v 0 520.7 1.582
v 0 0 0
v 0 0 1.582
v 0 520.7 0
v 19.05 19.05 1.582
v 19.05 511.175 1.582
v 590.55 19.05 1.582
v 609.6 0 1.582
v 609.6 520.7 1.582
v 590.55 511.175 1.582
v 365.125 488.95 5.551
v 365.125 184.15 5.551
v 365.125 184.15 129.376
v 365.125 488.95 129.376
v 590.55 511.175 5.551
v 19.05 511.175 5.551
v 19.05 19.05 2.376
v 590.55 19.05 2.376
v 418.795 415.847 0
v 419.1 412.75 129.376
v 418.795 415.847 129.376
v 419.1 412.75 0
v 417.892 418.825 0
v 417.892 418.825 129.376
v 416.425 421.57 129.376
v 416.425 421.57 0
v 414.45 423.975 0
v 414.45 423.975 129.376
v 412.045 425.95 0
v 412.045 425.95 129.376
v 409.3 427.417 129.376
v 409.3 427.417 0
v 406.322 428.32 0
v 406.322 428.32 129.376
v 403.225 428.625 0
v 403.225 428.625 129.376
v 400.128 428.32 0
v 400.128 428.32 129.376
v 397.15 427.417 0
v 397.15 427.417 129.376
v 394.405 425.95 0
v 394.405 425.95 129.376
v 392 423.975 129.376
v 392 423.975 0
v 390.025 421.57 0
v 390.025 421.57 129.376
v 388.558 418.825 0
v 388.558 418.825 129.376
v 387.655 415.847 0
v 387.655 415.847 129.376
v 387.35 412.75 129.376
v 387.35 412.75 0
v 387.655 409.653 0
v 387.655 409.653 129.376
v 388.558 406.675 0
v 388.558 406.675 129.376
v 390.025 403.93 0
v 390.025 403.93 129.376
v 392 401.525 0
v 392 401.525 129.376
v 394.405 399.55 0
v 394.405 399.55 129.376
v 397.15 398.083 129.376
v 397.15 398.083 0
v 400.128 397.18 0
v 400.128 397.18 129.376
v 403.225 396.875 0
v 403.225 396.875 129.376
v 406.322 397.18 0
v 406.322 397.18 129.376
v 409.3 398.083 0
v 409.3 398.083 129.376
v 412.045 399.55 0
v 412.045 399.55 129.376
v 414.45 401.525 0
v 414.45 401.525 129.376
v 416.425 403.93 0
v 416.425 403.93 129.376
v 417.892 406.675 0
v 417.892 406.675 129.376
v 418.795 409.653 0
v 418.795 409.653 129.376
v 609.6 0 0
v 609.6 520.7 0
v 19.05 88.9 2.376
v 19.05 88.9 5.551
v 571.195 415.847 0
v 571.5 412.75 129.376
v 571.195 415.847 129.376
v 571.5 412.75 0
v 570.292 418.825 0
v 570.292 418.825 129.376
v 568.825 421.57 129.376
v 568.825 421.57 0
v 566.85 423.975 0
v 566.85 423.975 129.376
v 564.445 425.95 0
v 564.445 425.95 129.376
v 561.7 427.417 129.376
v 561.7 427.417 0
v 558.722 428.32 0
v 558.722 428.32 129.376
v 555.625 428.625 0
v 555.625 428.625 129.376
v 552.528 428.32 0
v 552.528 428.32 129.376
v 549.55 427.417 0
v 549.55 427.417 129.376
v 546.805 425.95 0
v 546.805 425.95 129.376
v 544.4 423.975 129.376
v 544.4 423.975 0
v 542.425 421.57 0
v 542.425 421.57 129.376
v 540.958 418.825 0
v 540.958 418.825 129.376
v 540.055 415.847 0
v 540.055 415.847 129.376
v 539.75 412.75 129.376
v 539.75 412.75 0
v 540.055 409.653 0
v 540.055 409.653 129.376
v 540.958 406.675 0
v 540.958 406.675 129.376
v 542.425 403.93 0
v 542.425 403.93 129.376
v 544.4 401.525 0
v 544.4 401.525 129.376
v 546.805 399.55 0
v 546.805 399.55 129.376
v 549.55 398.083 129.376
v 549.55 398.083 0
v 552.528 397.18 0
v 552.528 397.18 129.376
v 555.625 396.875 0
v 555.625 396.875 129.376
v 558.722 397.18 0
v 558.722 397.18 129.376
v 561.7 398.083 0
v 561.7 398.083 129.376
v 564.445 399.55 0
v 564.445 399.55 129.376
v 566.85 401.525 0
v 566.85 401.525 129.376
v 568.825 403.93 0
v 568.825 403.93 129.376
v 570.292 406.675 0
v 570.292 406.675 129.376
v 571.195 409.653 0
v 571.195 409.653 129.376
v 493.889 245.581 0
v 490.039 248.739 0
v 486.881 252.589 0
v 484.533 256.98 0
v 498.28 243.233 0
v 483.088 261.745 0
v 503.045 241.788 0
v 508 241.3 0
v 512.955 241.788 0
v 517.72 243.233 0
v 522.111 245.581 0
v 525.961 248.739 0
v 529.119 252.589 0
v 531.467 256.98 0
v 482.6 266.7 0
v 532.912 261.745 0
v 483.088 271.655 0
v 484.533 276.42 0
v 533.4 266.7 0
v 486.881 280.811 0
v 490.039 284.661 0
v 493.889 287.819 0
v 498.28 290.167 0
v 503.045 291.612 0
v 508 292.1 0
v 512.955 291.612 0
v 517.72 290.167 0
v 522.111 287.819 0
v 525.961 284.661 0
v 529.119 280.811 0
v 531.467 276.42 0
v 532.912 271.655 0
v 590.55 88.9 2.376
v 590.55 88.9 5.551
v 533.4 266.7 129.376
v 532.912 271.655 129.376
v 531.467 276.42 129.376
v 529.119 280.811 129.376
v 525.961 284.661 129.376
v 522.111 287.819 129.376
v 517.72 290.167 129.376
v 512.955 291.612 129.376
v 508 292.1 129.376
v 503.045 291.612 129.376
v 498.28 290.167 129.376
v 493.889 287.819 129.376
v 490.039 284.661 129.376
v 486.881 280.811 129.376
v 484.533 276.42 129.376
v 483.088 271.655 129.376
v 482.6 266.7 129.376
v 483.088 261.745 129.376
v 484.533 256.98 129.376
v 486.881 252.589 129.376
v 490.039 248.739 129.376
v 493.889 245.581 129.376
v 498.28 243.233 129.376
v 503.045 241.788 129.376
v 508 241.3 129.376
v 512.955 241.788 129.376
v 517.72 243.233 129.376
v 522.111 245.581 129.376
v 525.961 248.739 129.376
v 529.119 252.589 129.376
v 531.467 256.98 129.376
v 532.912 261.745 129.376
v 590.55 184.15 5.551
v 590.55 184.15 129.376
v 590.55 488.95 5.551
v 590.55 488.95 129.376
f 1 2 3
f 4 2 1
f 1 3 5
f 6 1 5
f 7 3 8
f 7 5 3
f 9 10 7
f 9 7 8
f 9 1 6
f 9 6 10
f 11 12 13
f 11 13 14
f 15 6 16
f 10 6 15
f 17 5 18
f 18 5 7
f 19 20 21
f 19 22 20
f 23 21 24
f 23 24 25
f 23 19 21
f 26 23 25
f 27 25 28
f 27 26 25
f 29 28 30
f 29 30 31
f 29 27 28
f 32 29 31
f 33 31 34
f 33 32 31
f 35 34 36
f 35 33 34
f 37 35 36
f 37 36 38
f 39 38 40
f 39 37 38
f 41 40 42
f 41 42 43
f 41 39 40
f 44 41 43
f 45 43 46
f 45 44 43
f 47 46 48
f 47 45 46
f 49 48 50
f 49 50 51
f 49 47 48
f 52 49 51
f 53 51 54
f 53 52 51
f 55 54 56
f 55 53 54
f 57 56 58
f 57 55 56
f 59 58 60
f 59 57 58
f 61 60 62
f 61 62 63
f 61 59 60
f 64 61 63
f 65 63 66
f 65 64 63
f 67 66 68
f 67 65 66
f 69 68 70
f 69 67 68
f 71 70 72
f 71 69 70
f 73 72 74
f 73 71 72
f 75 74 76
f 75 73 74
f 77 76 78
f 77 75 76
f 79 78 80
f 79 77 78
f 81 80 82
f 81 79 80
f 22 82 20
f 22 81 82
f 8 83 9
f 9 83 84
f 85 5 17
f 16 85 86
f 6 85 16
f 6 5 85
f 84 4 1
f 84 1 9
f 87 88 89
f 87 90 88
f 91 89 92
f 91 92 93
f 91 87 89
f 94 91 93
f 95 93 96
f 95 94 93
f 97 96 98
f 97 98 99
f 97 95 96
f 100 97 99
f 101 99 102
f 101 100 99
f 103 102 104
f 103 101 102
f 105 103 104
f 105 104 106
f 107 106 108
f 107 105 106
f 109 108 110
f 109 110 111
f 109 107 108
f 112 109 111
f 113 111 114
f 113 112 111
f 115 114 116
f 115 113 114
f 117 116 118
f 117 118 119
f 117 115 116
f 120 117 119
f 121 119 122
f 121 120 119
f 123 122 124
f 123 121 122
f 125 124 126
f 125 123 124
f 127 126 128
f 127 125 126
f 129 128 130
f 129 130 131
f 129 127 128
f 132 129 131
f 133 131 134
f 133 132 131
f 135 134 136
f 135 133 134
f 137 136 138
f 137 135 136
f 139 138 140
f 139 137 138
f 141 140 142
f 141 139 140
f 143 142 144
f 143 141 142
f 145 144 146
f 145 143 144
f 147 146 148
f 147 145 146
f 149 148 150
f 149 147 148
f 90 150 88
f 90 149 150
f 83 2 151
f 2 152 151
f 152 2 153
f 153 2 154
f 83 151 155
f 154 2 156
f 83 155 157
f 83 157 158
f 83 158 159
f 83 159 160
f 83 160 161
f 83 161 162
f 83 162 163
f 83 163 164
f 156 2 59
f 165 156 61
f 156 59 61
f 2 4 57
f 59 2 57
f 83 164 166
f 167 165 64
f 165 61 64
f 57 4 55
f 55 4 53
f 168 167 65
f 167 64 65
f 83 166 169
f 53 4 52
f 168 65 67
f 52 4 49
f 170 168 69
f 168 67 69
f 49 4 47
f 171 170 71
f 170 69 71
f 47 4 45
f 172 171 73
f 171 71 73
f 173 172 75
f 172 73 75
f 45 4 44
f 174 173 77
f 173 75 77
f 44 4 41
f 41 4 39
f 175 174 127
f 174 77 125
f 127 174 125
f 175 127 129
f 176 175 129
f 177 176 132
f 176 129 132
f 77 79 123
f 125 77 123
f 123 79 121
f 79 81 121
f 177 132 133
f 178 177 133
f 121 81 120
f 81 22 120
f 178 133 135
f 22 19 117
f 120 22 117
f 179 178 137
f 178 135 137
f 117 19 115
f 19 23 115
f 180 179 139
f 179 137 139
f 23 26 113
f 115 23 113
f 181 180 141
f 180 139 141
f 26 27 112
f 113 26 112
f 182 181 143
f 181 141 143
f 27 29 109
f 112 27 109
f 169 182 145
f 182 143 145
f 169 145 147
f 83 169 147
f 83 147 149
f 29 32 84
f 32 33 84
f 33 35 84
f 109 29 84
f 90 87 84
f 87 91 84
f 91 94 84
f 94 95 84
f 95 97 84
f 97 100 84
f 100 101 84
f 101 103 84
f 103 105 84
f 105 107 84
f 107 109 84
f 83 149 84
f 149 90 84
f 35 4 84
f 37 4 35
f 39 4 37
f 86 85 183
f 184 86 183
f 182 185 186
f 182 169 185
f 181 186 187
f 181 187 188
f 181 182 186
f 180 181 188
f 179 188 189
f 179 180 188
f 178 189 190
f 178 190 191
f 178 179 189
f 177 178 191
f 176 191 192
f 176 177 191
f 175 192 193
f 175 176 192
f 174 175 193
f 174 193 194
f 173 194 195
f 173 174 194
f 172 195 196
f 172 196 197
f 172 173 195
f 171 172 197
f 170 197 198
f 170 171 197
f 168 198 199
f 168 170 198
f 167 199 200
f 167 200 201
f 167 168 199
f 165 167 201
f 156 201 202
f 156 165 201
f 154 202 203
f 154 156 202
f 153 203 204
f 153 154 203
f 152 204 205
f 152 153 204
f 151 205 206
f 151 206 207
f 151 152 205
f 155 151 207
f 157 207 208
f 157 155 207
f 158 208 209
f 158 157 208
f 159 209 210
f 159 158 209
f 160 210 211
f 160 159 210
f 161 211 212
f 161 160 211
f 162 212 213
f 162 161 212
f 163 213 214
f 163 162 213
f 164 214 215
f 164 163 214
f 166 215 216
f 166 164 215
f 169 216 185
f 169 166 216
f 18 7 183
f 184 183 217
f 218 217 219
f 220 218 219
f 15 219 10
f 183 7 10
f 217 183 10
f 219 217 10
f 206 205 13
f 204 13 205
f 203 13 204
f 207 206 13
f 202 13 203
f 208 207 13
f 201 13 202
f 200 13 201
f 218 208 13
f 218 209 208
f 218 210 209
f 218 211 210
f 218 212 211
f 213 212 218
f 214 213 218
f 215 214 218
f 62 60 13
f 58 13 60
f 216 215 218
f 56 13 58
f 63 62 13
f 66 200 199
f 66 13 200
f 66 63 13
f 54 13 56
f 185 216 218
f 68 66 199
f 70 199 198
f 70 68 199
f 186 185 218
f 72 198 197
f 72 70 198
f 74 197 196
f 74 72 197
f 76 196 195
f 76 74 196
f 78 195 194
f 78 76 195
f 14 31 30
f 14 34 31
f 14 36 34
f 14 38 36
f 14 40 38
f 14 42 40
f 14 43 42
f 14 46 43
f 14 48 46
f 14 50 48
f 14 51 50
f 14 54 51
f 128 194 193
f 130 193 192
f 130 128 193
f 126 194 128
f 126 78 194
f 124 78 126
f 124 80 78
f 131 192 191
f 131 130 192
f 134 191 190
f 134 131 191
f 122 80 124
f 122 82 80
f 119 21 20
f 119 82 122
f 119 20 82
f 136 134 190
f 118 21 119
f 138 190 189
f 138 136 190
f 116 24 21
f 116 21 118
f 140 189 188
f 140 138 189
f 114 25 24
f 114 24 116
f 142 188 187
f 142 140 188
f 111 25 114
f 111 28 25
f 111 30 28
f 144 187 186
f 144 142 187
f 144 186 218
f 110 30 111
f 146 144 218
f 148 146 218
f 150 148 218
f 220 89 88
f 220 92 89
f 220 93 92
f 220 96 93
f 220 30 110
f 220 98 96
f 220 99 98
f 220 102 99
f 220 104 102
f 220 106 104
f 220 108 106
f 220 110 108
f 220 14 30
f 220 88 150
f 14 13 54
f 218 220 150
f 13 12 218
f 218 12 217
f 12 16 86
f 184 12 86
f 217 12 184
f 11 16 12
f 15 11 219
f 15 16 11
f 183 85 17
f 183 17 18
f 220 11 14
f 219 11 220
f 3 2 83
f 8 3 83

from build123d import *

# Parameters (mm, degrees)
F0_W     = 609.6
F0_H     = 520.7
F0_R     = 25.4
F0_R_2   = 15.875
F1_DEPTH = 1.58242
F2_W     = 571.5
F2_H     = 492.125
F2_R     = 25.4
F2_R_2   = 15.875
F3_DEPTH = 0.79375
F4_W     = 571.5
F4_H     = 422.275
F4_R     = 25.4
F4_R_2   = 15.875
F5_DEPTH = 3.175
F6_W     = 225.425
F6_H     = 304.8
F6_R     = 25.4
F6_R_2   = 15.875
F7_DEPTH = 127


with BuildPart() as f1:
    # F0 (on Top) → F1 (new body)
    with BuildSketch(Plane.XY):
        with Locations((304.8, 260.35)):
            Rectangle(F0_W, F0_H)
        with Locations((508, 266.7)):
            Circle(F0_R, mode=Mode.SUBTRACT)
        with Locations((403.225, 412.75)):
            Circle(F0_R_2, mode=Mode.SUBTRACT)
        with Locations((555.625, 412.75)):
            Circle(F0_R_2, mode=Mode.SUBTRACT)
    extrude(amount=F1_DEPTH)

    # F2 (on face) → F3 (join)
    with BuildSketch(Plane.XY.offset(1.58242)):
        with Locations((304.8, 265.1125)):
            Rectangle(F2_W, F2_H)
        with Locations((508, 266.7)):
            Circle(F2_R, mode=Mode.SUBTRACT)
        with Locations((403.225, 412.75)):
            Circle(F2_R_2, mode=Mode.SUBTRACT)
        with Locations((555.625, 412.75)):
            Circle(F2_R_2, mode=Mode.SUBTRACT)
    extrude(amount=F3_DEPTH)

    # F4 (on face) → F5 (join)
    with BuildSketch(Plane.XY.offset(2.37617)):
        with Locations((304.8, 300.0375)):
            Rectangle(F4_W, F4_H)
        with Locations((508, 266.7)):
            Circle(F4_R, mode=Mode.SUBTRACT)
        with Locations((403.225, 412.75)):
            Circle(F4_R_2, mode=Mode.SUBTRACT)
        with Locations((555.625, 412.75)):
            Circle(F4_R_2, mode=Mode.SUBTRACT)
    extrude(amount=F5_DEPTH)

    # F6 (on face) → F7 (join)
    with BuildSketch(Plane.XY.offset(2.37617)):
        with Locations((477.8375, 336.55)):
            Rectangle(F6_W, F6_H)
        with Locations((508, 266.7)):
            Circle(F6_R, mode=Mode.SUBTRACT)
        with Locations((403.225, 412.75)):
            Circle(F6_R_2, mode=Mode.SUBTRACT)
        with Locations((555.625, 412.75)):
            Circle(F6_R_2, mode=Mode.SUBTRACT)
    extrude(amount=F7_DEPTH)


solid = f1.part
